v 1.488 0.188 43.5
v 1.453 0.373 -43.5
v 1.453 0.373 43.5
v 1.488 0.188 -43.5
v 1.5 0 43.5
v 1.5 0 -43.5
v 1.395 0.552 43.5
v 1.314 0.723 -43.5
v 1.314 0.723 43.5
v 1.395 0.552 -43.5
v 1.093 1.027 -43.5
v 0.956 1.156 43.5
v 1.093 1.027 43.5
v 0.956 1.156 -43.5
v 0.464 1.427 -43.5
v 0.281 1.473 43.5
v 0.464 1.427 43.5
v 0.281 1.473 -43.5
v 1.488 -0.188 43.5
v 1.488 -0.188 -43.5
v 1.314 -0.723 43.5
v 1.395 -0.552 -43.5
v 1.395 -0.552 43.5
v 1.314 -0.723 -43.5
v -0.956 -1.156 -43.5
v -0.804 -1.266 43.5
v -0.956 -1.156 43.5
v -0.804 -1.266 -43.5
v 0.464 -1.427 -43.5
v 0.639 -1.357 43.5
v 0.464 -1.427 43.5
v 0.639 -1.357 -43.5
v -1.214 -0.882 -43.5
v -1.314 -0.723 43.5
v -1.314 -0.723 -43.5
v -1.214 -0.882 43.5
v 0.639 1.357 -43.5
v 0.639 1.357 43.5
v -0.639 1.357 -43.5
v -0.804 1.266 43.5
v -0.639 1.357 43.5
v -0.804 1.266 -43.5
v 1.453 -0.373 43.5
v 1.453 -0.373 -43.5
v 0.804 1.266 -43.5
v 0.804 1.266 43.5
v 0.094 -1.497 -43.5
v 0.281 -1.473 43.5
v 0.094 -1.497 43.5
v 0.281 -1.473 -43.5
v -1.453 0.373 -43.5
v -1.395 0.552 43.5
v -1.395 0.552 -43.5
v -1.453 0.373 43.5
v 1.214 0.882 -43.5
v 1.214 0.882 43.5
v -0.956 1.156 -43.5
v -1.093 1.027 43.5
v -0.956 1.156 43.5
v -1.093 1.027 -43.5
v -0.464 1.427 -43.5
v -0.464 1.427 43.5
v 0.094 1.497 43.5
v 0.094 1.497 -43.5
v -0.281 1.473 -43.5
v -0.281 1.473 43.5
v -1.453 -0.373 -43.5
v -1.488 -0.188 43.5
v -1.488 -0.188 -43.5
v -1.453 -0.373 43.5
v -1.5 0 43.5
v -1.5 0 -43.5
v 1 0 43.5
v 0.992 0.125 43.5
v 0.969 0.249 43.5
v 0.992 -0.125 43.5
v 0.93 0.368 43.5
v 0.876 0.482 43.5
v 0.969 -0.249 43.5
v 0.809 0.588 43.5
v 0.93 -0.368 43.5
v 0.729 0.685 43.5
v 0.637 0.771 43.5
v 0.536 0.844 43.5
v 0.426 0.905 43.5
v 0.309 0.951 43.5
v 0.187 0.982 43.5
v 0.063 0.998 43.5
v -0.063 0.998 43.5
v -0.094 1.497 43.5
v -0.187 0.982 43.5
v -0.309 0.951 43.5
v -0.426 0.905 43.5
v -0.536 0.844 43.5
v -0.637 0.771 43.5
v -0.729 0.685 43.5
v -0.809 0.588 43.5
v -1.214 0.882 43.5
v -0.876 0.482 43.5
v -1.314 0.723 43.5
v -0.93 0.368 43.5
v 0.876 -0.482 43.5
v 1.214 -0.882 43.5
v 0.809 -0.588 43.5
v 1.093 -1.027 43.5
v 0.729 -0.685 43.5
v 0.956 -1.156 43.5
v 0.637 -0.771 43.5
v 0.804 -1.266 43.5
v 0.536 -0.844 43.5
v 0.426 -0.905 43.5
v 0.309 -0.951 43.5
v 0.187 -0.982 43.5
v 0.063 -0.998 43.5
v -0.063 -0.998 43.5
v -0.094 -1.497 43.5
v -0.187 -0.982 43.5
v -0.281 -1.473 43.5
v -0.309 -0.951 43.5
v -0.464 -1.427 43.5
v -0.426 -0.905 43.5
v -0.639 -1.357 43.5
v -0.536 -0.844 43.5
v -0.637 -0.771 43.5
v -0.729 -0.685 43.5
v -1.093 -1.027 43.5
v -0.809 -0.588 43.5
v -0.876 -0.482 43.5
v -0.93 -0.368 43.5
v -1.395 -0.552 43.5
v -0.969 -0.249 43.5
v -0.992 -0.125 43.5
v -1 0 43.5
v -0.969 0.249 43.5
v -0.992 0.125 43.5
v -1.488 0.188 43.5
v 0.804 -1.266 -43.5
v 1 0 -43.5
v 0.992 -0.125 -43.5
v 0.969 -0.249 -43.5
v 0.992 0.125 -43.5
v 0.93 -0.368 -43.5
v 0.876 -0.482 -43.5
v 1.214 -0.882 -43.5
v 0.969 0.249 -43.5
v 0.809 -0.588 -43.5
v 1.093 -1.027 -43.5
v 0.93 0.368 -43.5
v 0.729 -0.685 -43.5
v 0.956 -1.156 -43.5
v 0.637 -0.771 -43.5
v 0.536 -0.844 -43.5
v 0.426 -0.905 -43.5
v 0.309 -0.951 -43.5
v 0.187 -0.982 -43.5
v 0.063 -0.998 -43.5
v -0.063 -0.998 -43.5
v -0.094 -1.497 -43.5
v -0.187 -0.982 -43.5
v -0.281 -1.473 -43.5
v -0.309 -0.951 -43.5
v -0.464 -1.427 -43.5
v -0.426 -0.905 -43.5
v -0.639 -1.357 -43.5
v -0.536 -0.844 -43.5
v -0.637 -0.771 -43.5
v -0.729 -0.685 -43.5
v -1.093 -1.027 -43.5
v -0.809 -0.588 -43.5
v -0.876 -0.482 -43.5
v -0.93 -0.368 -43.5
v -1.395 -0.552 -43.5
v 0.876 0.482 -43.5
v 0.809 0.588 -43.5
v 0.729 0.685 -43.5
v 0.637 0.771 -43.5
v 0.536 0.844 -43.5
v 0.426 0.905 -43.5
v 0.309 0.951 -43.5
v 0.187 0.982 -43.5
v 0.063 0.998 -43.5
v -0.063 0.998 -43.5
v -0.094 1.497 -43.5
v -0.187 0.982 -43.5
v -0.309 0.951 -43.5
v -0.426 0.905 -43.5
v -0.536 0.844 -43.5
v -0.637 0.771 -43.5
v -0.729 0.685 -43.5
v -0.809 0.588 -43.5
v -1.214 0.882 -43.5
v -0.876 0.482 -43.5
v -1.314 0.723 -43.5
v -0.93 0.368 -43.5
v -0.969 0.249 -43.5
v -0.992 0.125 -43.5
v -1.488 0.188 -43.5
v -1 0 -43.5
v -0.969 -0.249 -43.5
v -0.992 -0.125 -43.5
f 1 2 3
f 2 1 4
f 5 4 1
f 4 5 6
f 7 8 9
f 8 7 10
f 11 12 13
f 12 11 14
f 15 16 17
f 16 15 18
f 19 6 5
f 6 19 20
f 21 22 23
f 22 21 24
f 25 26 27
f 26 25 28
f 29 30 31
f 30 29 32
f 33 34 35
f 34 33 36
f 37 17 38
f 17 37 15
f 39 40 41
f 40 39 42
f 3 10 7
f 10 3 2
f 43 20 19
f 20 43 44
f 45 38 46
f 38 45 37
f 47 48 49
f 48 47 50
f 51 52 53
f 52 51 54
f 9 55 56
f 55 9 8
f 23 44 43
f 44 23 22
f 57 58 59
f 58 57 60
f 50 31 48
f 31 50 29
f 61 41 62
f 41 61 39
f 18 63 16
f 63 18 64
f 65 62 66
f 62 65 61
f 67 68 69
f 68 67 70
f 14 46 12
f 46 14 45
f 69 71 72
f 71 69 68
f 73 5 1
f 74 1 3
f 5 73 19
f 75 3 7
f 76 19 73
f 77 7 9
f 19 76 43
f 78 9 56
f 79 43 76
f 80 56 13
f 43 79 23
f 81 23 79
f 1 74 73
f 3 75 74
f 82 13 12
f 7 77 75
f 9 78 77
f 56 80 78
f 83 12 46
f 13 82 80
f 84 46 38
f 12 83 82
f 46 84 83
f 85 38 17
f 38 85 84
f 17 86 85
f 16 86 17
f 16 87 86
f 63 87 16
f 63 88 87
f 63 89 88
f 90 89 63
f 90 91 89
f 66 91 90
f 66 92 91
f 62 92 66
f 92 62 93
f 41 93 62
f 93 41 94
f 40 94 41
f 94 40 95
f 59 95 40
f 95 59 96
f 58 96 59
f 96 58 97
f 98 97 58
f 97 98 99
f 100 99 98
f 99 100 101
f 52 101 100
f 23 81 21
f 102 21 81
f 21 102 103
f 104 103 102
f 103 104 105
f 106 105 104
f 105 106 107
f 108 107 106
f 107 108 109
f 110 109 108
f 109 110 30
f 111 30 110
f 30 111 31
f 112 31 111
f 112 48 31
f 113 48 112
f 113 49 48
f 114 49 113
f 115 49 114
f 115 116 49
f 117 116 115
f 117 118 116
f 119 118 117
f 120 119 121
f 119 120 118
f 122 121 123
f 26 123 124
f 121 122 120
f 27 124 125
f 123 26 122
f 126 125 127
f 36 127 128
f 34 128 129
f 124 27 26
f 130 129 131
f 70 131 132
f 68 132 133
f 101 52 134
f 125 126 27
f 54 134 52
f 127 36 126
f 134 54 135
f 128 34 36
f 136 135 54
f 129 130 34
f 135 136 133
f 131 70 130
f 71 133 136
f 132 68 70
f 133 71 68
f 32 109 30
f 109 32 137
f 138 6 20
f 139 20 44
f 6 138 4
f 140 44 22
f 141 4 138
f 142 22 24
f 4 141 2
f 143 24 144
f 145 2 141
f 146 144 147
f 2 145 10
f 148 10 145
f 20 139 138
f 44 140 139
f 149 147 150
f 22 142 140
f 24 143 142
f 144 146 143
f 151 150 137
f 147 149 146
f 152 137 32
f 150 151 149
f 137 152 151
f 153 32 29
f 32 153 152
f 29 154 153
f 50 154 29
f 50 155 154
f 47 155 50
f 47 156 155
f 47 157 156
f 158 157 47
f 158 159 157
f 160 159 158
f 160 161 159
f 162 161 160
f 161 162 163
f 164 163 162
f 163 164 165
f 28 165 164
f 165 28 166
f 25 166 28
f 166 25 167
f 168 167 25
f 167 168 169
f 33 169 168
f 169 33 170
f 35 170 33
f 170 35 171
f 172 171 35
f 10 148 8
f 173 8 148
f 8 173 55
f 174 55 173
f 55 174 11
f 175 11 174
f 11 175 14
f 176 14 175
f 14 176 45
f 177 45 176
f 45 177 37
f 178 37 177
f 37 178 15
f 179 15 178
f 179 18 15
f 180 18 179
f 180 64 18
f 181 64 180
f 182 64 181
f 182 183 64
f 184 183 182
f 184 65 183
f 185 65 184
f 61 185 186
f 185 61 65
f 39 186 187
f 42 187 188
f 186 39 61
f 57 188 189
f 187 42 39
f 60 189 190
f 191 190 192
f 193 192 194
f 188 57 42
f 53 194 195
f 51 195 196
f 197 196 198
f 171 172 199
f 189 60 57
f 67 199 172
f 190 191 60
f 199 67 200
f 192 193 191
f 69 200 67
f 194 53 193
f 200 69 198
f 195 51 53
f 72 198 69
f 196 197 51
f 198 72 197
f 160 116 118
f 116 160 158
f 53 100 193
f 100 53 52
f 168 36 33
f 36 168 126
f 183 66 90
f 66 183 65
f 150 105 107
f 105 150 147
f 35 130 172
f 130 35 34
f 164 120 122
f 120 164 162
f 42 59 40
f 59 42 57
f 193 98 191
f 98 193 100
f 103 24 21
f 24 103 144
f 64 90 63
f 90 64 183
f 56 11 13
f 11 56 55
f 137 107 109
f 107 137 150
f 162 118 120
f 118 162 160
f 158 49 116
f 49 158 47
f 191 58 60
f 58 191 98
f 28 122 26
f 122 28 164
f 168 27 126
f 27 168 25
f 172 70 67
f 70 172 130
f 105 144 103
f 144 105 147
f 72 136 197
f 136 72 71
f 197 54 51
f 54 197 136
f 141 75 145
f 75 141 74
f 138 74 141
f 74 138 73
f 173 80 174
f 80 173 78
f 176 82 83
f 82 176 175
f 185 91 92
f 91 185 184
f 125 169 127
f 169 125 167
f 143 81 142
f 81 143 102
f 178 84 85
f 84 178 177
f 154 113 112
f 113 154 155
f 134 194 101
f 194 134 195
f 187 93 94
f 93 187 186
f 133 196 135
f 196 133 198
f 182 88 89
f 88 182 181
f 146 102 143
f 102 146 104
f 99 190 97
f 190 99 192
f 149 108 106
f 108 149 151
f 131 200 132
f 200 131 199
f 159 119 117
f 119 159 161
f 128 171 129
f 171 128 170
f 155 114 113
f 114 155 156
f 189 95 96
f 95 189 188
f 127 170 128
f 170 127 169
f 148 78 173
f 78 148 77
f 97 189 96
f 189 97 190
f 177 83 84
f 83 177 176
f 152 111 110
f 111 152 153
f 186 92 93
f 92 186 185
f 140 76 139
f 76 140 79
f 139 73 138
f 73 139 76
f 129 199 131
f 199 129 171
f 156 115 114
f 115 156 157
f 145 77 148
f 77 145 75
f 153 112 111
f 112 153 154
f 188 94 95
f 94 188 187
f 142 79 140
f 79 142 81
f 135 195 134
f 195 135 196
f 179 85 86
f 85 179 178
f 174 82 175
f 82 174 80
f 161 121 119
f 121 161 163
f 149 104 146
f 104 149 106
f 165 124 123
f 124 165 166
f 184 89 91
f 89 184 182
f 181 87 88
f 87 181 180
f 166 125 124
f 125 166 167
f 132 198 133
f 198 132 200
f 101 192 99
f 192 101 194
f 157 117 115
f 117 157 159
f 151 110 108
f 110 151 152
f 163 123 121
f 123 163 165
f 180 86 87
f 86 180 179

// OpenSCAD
$fn = 50;


difference() {
	union() {
		translate(v = [0, 0, -43.5000000000]) {
			cylinder(h = 87, r = 1.5000000000);
		}
	}
	union() {
		translate(v = [0, 0, -100.0000000000]) {
			cylinder(h = 200, r = 1.0000000000);
		}
	}
}
